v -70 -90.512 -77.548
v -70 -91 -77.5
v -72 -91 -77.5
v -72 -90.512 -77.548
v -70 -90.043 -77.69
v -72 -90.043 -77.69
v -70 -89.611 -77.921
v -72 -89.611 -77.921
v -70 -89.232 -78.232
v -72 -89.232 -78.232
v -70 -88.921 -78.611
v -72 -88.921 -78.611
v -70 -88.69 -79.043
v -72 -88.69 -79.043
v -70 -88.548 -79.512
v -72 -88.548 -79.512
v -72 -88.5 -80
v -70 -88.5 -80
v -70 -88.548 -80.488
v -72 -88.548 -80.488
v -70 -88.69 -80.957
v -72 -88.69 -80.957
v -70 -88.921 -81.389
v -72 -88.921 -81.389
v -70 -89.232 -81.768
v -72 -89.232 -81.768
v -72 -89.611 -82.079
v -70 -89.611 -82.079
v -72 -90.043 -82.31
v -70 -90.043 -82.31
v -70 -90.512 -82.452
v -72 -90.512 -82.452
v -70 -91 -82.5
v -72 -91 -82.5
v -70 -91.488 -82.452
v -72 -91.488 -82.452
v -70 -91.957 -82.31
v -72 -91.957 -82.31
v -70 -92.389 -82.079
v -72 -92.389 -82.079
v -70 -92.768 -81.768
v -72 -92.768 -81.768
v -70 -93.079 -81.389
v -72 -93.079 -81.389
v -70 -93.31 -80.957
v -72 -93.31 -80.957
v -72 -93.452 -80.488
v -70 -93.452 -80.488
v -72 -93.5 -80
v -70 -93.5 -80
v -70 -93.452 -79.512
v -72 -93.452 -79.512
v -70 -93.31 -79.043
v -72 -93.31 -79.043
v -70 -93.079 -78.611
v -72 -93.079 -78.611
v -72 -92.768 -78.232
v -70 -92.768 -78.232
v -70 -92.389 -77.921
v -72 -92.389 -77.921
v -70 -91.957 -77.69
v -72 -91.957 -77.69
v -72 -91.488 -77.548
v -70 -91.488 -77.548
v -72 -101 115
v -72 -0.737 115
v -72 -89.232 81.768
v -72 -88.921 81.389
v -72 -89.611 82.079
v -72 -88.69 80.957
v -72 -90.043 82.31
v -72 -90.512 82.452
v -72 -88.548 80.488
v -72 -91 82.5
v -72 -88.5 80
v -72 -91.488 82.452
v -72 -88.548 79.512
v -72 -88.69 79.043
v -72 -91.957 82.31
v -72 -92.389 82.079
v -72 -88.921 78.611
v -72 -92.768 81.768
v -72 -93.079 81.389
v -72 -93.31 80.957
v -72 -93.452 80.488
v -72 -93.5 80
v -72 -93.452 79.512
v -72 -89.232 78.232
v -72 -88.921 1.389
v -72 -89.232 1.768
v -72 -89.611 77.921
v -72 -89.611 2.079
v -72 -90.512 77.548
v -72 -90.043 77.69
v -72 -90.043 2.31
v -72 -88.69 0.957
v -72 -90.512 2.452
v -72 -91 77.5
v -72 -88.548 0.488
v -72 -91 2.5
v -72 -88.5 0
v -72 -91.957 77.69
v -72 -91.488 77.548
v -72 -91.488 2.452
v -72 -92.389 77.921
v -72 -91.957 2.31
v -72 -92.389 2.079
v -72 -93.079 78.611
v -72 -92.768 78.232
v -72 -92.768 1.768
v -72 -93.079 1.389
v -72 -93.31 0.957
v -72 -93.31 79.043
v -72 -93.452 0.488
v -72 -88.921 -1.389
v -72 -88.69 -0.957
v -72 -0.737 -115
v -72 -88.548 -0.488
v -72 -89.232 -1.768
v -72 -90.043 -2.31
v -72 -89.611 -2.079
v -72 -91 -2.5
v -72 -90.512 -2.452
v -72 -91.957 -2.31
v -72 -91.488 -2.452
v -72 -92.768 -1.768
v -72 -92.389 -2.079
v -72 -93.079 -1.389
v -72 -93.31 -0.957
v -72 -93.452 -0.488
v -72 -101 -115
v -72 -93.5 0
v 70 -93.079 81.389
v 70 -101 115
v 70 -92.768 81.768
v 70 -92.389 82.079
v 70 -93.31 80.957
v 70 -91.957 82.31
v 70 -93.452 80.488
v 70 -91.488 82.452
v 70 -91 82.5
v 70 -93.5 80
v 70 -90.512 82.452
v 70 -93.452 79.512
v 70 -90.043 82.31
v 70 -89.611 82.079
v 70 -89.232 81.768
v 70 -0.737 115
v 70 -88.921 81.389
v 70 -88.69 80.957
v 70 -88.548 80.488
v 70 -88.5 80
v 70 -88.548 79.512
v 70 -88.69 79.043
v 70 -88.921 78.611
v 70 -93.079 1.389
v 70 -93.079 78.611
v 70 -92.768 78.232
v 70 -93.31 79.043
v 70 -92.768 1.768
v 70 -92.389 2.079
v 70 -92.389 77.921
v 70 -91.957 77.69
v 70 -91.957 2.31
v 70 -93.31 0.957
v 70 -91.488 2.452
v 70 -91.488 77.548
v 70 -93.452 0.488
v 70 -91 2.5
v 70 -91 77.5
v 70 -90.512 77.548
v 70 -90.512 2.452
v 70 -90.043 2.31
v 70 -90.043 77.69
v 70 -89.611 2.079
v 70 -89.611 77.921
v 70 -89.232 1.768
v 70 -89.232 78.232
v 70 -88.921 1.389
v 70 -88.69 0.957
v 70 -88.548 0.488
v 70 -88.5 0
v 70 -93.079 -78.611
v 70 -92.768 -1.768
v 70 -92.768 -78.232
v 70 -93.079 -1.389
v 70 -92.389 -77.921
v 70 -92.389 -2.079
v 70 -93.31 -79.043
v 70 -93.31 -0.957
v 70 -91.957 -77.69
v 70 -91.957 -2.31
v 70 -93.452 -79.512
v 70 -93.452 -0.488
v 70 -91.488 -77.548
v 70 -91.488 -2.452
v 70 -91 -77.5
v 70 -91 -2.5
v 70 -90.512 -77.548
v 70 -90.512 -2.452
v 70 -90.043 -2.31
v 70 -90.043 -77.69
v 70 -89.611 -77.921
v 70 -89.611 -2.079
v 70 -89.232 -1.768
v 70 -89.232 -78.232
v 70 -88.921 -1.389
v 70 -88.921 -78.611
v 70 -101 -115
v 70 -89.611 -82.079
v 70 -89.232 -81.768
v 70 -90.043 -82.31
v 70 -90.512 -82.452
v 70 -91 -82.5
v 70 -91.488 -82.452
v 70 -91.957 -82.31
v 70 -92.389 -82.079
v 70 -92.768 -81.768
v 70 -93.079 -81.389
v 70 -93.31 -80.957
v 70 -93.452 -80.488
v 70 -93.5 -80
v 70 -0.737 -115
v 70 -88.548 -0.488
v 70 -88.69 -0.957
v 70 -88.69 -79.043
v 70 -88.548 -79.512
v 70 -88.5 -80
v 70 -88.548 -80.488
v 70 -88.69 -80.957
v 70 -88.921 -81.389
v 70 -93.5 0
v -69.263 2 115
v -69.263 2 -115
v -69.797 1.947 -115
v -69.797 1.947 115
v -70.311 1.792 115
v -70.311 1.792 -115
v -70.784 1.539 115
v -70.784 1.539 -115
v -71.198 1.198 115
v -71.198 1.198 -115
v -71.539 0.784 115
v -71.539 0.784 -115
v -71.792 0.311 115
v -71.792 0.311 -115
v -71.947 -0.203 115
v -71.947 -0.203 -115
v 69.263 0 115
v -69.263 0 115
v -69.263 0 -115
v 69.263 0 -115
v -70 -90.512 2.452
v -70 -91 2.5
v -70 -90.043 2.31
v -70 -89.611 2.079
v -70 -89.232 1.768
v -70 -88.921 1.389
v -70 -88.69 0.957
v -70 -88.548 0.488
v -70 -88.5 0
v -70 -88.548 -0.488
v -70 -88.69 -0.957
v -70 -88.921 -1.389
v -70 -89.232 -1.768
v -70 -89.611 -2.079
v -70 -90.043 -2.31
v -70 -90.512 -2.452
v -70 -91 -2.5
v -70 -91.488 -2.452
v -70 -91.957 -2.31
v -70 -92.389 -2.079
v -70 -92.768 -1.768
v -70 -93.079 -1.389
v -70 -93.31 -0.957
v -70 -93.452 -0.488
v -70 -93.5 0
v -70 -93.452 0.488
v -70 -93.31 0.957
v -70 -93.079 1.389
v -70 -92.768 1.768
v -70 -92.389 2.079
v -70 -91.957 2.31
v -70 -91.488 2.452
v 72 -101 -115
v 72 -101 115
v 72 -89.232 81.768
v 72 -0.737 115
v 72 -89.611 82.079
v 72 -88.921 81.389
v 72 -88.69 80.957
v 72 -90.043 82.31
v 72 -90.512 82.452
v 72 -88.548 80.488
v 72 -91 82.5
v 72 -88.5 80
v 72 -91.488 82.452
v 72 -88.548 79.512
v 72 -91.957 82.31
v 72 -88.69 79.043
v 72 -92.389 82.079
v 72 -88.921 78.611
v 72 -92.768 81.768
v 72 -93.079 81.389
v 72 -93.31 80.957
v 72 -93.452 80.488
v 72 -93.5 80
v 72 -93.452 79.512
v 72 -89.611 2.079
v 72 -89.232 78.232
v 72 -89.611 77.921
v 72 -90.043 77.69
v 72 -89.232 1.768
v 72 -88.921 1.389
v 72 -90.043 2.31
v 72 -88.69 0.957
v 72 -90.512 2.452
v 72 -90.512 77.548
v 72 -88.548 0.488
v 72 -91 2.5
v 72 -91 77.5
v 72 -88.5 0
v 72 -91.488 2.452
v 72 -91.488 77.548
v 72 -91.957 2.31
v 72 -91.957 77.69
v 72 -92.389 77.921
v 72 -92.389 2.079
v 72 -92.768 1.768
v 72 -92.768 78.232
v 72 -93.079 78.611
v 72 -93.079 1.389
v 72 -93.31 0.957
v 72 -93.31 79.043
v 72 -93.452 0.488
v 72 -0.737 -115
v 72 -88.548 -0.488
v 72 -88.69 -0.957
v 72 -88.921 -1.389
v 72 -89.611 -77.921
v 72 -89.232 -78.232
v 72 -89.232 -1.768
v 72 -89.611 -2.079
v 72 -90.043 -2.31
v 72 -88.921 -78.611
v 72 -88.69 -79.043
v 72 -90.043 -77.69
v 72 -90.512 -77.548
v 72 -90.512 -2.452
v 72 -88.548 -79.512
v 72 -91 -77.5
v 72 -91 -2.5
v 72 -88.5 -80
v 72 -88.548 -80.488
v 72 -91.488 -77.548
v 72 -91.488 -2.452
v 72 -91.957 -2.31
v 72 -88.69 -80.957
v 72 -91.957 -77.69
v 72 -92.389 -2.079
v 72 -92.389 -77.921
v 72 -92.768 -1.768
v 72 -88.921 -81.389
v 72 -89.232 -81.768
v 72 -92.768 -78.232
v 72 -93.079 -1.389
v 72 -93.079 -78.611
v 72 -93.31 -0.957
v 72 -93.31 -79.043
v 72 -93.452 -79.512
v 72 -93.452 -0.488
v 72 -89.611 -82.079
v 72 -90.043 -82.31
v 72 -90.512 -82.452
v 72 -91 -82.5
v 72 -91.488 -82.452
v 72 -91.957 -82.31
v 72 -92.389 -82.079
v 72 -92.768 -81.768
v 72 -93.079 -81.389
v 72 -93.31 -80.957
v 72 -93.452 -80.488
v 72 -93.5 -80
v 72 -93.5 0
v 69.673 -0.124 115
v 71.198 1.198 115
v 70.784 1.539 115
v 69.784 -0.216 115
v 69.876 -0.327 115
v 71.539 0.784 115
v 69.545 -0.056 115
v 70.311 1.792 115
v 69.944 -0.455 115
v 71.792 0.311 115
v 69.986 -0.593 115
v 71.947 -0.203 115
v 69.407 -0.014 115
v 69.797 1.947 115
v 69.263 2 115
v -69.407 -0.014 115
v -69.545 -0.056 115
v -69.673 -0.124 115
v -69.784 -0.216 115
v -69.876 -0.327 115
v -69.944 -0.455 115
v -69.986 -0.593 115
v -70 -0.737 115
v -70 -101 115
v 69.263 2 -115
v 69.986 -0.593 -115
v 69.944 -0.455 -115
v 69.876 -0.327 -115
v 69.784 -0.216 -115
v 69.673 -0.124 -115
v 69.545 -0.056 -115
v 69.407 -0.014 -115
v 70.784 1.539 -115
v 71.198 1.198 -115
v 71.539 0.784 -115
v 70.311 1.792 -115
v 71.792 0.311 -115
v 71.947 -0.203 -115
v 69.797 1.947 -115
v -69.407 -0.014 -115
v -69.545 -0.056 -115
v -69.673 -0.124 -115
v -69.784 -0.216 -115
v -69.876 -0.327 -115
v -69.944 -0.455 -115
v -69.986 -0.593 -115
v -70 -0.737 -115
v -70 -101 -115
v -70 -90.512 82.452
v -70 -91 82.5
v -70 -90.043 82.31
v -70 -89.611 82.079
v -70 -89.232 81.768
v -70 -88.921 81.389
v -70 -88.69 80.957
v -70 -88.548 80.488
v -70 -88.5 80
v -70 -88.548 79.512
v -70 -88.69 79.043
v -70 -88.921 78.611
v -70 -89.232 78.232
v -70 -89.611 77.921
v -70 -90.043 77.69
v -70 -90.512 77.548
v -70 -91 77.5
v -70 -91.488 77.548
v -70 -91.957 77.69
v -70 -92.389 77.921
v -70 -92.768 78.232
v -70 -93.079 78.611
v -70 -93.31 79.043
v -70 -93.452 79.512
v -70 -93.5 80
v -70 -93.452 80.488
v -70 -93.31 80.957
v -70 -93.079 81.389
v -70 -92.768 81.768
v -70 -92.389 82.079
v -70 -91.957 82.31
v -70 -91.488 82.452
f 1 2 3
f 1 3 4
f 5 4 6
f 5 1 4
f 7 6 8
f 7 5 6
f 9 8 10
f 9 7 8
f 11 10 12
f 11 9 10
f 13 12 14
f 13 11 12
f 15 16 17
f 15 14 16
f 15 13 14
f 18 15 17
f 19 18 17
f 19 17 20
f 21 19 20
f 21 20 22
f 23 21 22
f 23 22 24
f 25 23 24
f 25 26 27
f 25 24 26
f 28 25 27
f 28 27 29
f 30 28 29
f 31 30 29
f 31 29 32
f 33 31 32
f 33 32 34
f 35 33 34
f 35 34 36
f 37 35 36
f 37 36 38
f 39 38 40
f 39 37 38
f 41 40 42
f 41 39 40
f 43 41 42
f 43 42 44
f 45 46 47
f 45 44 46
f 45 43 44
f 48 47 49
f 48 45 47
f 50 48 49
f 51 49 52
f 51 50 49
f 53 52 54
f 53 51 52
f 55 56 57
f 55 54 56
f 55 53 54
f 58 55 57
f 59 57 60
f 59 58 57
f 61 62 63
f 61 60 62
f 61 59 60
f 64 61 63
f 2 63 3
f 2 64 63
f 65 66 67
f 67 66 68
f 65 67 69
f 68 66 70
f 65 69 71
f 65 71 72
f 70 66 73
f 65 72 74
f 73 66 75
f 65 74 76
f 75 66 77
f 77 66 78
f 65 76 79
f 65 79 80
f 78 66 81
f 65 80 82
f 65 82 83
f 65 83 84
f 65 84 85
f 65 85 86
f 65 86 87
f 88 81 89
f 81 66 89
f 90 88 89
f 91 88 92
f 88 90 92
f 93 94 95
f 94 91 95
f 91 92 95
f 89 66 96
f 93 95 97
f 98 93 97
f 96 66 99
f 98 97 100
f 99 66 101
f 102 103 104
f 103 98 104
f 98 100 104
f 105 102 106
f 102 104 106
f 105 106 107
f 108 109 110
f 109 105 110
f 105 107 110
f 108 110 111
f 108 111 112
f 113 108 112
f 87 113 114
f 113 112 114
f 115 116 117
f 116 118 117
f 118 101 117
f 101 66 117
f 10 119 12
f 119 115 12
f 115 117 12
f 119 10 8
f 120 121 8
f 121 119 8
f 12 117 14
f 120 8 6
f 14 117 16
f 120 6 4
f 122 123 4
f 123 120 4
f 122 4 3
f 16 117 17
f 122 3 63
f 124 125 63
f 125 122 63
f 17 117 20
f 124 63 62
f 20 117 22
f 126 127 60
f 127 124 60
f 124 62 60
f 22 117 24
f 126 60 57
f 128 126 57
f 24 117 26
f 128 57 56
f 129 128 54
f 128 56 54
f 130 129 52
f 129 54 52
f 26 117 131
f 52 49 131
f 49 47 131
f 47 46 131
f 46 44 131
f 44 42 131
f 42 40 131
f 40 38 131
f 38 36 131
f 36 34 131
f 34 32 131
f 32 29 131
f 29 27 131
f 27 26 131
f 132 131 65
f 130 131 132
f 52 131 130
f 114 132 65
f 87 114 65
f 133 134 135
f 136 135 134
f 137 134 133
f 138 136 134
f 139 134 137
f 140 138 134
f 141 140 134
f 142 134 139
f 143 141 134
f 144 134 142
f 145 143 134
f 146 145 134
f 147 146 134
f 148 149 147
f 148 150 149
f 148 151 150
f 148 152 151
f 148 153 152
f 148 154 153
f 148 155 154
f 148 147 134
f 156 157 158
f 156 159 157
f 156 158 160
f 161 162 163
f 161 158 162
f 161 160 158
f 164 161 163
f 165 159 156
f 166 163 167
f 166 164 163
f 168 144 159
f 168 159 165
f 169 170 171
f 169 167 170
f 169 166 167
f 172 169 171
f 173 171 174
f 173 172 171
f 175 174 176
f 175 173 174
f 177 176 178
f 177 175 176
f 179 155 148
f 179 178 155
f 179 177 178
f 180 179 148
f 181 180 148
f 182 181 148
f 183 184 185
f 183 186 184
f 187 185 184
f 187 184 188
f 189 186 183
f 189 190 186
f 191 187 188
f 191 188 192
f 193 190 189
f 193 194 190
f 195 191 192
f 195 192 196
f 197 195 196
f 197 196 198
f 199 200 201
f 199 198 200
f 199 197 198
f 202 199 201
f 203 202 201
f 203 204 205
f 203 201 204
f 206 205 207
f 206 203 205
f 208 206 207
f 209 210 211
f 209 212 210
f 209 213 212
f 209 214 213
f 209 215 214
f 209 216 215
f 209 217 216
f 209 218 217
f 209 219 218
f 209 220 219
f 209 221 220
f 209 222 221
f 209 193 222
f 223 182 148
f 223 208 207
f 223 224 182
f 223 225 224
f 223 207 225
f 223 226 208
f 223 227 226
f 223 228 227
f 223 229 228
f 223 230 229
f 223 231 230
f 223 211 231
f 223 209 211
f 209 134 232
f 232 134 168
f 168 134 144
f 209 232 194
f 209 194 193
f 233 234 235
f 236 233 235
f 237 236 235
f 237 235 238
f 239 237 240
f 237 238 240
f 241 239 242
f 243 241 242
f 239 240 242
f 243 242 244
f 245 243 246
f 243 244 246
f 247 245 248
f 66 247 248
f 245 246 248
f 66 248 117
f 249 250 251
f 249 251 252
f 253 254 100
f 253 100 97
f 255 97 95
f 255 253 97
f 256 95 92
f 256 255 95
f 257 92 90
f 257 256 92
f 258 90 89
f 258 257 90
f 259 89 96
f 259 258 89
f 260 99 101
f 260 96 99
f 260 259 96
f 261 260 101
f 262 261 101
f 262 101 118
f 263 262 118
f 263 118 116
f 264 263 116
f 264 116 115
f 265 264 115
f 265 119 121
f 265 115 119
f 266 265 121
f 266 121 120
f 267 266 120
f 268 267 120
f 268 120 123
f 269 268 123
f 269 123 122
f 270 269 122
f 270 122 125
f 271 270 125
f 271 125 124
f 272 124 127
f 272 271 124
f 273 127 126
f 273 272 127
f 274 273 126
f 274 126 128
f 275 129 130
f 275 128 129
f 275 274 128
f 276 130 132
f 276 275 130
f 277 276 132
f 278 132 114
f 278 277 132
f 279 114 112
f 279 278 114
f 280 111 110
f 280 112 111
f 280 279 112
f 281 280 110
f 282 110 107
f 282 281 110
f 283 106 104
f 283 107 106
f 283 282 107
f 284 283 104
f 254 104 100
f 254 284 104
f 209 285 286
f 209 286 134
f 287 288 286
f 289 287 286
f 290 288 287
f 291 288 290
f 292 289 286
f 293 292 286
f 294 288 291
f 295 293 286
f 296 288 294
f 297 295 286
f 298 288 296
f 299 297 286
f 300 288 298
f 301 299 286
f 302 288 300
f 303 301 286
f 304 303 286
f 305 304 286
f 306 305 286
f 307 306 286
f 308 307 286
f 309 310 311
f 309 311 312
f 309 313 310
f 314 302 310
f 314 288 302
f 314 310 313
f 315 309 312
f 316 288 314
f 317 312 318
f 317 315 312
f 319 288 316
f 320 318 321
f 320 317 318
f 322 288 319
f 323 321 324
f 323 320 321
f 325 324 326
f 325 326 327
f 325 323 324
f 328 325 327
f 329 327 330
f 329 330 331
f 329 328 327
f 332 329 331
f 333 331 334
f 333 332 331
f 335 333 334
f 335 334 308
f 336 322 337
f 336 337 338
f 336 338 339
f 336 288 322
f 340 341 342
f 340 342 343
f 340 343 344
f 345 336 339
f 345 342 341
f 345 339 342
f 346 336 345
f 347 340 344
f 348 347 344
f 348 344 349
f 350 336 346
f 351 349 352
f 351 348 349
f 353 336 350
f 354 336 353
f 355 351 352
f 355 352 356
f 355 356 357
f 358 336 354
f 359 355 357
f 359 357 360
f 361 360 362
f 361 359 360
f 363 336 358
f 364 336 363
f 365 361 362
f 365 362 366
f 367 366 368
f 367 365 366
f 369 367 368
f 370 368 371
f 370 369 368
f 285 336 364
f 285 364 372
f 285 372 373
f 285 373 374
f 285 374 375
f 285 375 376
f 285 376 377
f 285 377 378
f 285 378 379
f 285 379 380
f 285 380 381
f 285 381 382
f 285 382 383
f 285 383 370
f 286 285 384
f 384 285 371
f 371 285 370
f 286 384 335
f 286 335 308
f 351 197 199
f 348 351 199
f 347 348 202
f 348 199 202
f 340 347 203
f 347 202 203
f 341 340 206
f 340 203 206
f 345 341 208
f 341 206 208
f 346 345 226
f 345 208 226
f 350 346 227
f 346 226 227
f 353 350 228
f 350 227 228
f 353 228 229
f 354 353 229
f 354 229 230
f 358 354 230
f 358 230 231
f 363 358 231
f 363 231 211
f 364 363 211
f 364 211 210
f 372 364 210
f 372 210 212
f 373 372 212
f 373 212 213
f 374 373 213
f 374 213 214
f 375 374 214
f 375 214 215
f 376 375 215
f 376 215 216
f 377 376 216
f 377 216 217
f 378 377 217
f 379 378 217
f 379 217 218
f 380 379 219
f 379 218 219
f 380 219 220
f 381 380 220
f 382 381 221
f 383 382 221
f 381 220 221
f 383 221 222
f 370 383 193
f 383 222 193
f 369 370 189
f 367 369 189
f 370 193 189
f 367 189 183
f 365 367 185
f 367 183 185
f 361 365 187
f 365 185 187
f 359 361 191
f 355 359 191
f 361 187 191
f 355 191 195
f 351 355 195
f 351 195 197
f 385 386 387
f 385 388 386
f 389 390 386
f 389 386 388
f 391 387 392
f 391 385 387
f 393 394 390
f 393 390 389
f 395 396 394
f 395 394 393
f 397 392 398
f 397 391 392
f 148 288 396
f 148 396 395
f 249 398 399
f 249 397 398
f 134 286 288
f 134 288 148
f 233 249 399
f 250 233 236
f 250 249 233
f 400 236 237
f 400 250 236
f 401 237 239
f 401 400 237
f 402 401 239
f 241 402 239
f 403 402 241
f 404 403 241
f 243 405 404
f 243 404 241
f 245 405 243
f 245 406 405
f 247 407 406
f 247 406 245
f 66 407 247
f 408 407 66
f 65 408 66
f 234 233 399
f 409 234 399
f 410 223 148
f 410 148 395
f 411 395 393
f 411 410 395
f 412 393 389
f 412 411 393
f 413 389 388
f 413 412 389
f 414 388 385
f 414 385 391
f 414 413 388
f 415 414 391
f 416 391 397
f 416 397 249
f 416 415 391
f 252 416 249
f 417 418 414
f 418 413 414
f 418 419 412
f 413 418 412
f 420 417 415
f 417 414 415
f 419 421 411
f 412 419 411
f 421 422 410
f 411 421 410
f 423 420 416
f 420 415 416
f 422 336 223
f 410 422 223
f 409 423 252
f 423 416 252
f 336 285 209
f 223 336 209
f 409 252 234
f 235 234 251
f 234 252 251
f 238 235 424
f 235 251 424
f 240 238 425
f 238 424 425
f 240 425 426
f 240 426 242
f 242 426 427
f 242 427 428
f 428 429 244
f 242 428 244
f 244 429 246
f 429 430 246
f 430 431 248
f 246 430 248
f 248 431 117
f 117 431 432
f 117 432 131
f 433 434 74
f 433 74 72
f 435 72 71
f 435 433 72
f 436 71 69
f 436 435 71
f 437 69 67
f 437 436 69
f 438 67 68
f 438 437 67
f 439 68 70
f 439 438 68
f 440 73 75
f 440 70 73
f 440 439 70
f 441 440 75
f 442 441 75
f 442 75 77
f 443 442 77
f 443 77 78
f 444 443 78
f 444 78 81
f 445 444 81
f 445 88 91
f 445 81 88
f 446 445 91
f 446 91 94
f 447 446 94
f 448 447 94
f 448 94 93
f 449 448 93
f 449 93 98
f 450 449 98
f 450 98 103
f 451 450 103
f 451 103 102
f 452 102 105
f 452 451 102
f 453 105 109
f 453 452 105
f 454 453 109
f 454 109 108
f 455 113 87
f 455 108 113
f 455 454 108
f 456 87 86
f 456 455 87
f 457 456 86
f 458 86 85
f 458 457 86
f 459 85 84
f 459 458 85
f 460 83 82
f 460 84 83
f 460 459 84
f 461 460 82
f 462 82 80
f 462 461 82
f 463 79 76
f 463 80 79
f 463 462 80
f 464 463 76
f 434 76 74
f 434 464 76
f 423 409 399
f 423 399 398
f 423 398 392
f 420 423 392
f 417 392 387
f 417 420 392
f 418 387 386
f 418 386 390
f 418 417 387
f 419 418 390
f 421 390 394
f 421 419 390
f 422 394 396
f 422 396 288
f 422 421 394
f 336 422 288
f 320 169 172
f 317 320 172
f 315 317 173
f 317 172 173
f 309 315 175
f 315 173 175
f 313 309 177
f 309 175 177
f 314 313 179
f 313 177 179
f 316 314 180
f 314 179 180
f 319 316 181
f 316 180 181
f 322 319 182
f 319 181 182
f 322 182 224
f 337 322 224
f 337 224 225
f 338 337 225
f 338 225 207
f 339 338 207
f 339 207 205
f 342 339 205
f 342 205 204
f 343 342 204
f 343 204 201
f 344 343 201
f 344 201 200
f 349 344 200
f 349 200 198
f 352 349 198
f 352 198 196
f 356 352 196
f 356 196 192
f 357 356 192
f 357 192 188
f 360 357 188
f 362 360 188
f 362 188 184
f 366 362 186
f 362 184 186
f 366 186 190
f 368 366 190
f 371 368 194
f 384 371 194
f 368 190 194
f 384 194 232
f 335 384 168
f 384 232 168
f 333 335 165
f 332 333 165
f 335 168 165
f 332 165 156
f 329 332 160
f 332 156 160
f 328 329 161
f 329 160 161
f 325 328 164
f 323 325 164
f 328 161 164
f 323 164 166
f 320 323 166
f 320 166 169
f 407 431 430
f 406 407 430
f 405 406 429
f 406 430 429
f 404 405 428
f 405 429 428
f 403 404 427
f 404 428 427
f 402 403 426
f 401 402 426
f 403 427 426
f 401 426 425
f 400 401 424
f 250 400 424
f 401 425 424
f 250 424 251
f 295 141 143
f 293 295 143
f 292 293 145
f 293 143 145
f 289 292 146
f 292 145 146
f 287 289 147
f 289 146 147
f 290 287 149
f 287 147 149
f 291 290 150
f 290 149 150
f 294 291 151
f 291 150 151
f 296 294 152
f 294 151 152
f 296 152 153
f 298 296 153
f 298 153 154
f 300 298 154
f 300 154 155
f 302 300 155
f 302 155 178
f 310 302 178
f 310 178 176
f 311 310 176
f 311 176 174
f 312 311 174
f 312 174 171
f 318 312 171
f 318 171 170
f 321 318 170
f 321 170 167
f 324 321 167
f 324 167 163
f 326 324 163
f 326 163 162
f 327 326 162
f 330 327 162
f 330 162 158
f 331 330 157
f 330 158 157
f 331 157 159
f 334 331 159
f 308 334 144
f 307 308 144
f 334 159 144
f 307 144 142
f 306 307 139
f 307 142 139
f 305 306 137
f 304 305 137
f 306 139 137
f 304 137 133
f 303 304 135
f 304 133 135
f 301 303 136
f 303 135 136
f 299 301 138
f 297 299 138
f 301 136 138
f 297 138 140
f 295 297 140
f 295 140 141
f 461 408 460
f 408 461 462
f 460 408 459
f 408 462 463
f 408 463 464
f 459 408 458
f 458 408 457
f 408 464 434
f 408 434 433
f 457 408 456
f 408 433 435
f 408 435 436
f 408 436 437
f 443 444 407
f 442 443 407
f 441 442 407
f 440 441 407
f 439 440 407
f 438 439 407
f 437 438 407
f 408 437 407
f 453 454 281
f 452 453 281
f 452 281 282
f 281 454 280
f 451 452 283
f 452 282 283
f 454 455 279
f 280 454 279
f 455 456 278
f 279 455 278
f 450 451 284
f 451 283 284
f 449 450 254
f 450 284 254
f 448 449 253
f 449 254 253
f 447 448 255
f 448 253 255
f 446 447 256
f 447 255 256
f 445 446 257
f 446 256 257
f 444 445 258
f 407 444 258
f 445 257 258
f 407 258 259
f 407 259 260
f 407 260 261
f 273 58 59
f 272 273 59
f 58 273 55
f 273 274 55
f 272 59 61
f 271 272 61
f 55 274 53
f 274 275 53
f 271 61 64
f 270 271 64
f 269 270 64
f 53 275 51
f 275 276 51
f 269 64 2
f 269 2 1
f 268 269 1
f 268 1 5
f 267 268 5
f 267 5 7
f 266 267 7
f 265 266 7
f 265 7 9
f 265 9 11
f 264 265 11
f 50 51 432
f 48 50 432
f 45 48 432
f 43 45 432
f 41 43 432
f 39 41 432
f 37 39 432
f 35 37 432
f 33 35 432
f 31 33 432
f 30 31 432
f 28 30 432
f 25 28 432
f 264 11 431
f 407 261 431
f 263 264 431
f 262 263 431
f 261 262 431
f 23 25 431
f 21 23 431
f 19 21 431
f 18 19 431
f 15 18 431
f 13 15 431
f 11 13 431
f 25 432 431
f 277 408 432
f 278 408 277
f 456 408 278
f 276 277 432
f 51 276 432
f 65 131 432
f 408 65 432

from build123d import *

# Parameters (mm, degrees)
SKETCH2_W                    = 140
SKETCH2_H                    = 230
BASE_FLANGE1_DEPTH           = 2
EDGE_FLANGE1_STRIP_W         = 9.4732
EDGE_FLANGE1_STRIP_H         = 2
EDGE_FLANGE1_STRIP_CUT_DEPTH = 230
EDGE_FLANGE1_DEPTH           = 230
F_5_0_5_DIAMETER_HOLE1_D     = 5
F_5_0_5_DIAMETER_HOLE1_DEPTH = 144


# Sheet-metal steps are written as plain solids
with BuildPart() as part:
    # Sketch2 → Base-Flange1 (new body)
    with BuildSketch(Plane(origin=(0, 0, 0), x_dir=(1, 0, 0), z_dir=(0, 1, 0))):
        Rectangle(SKETCH2_W, SKETCH2_H)
    extrude(amount=BASE_FLANGE1_DEPTH)

    # Edge-Flange1 strip (across the edge) → Edge-Flange1 strip cut (cut)
    with BuildSketch(Plane(origin=(70, 0, -115), x_dir=(-1, 0, 0), z_dir=(0, 0, 1))):
        with Locations((-4, -1)):
            Rectangle(EDGE_FLANGE1_STRIP_W, EDGE_FLANGE1_STRIP_H)
    edge_flange1_strip_cut = extrude(amount=EDGE_FLANGE1_STRIP_CUT_DEPTH, mode=Mode.SUBTRACT)

    # Edge-Flange1 section (across the edge) → Edge-Flange1 (add)
    with BuildSketch(Plane(origin=(70, 0, -115), x_dir=(-1, 0, 0), z_dir=(0, 0, 1))):
        with BuildLine():
            Line((-2, 0.7366), (-2, 101))
            Line((-2, 101), (0, 101))
            Line((0, 101), (0, 0.7366))
            ThreePointArc((0, 0.7366), (0.215745145, 0.215745145), (0.7366, 0))
            Line((0.7366, 0), (0.7366, -2))
            ThreePointArc((0.7366, -2), (-1.198468417, -1.198468417), (-2, 0.7366))
        make_face()
    edge_flange1 = extrude(amount=EDGE_FLANGE1_DEPTH)

    # Ø5.0 (5) Diameter Hole1
    with Locations(Plane(origin=(72, 0, 0), x_dir=(0, 0, -1), z_dir=(1, 0, 0))):
        with Locations((0, -91), (80, -91), (-80, -91)):
            f_5_0_5_diameter_hole1 = Hole(F_5_0_5_DIAMETER_HOLE1_D / 2, depth=F_5_0_5_DIAMETER_HOLE1_DEPTH)

    # Mirror1: Edge-Flange1 strip cut, Edge-Flange1, Ø5.0 (5) Diameter Hole1 across plane
    add(edge_flange1_strip_cut.mirror(Plane(origin=(0, 0, 0), x_dir=(0, 0, 1), z_dir=(1, 0, 0))), mode=Mode.SUBTRACT)
    add(edge_flange1.mirror(Plane(origin=(0, 0, 0), x_dir=(0, 0, 1), z_dir=(1, 0, 0))))
    add(f_5_0_5_diameter_hole1.mirror(Plane(origin=(0, 0, 0), x_dir=(0, 0, 1), z_dir=(1, 0, 0))), mode=Mode.SUBTRACT)


solid = part.part
